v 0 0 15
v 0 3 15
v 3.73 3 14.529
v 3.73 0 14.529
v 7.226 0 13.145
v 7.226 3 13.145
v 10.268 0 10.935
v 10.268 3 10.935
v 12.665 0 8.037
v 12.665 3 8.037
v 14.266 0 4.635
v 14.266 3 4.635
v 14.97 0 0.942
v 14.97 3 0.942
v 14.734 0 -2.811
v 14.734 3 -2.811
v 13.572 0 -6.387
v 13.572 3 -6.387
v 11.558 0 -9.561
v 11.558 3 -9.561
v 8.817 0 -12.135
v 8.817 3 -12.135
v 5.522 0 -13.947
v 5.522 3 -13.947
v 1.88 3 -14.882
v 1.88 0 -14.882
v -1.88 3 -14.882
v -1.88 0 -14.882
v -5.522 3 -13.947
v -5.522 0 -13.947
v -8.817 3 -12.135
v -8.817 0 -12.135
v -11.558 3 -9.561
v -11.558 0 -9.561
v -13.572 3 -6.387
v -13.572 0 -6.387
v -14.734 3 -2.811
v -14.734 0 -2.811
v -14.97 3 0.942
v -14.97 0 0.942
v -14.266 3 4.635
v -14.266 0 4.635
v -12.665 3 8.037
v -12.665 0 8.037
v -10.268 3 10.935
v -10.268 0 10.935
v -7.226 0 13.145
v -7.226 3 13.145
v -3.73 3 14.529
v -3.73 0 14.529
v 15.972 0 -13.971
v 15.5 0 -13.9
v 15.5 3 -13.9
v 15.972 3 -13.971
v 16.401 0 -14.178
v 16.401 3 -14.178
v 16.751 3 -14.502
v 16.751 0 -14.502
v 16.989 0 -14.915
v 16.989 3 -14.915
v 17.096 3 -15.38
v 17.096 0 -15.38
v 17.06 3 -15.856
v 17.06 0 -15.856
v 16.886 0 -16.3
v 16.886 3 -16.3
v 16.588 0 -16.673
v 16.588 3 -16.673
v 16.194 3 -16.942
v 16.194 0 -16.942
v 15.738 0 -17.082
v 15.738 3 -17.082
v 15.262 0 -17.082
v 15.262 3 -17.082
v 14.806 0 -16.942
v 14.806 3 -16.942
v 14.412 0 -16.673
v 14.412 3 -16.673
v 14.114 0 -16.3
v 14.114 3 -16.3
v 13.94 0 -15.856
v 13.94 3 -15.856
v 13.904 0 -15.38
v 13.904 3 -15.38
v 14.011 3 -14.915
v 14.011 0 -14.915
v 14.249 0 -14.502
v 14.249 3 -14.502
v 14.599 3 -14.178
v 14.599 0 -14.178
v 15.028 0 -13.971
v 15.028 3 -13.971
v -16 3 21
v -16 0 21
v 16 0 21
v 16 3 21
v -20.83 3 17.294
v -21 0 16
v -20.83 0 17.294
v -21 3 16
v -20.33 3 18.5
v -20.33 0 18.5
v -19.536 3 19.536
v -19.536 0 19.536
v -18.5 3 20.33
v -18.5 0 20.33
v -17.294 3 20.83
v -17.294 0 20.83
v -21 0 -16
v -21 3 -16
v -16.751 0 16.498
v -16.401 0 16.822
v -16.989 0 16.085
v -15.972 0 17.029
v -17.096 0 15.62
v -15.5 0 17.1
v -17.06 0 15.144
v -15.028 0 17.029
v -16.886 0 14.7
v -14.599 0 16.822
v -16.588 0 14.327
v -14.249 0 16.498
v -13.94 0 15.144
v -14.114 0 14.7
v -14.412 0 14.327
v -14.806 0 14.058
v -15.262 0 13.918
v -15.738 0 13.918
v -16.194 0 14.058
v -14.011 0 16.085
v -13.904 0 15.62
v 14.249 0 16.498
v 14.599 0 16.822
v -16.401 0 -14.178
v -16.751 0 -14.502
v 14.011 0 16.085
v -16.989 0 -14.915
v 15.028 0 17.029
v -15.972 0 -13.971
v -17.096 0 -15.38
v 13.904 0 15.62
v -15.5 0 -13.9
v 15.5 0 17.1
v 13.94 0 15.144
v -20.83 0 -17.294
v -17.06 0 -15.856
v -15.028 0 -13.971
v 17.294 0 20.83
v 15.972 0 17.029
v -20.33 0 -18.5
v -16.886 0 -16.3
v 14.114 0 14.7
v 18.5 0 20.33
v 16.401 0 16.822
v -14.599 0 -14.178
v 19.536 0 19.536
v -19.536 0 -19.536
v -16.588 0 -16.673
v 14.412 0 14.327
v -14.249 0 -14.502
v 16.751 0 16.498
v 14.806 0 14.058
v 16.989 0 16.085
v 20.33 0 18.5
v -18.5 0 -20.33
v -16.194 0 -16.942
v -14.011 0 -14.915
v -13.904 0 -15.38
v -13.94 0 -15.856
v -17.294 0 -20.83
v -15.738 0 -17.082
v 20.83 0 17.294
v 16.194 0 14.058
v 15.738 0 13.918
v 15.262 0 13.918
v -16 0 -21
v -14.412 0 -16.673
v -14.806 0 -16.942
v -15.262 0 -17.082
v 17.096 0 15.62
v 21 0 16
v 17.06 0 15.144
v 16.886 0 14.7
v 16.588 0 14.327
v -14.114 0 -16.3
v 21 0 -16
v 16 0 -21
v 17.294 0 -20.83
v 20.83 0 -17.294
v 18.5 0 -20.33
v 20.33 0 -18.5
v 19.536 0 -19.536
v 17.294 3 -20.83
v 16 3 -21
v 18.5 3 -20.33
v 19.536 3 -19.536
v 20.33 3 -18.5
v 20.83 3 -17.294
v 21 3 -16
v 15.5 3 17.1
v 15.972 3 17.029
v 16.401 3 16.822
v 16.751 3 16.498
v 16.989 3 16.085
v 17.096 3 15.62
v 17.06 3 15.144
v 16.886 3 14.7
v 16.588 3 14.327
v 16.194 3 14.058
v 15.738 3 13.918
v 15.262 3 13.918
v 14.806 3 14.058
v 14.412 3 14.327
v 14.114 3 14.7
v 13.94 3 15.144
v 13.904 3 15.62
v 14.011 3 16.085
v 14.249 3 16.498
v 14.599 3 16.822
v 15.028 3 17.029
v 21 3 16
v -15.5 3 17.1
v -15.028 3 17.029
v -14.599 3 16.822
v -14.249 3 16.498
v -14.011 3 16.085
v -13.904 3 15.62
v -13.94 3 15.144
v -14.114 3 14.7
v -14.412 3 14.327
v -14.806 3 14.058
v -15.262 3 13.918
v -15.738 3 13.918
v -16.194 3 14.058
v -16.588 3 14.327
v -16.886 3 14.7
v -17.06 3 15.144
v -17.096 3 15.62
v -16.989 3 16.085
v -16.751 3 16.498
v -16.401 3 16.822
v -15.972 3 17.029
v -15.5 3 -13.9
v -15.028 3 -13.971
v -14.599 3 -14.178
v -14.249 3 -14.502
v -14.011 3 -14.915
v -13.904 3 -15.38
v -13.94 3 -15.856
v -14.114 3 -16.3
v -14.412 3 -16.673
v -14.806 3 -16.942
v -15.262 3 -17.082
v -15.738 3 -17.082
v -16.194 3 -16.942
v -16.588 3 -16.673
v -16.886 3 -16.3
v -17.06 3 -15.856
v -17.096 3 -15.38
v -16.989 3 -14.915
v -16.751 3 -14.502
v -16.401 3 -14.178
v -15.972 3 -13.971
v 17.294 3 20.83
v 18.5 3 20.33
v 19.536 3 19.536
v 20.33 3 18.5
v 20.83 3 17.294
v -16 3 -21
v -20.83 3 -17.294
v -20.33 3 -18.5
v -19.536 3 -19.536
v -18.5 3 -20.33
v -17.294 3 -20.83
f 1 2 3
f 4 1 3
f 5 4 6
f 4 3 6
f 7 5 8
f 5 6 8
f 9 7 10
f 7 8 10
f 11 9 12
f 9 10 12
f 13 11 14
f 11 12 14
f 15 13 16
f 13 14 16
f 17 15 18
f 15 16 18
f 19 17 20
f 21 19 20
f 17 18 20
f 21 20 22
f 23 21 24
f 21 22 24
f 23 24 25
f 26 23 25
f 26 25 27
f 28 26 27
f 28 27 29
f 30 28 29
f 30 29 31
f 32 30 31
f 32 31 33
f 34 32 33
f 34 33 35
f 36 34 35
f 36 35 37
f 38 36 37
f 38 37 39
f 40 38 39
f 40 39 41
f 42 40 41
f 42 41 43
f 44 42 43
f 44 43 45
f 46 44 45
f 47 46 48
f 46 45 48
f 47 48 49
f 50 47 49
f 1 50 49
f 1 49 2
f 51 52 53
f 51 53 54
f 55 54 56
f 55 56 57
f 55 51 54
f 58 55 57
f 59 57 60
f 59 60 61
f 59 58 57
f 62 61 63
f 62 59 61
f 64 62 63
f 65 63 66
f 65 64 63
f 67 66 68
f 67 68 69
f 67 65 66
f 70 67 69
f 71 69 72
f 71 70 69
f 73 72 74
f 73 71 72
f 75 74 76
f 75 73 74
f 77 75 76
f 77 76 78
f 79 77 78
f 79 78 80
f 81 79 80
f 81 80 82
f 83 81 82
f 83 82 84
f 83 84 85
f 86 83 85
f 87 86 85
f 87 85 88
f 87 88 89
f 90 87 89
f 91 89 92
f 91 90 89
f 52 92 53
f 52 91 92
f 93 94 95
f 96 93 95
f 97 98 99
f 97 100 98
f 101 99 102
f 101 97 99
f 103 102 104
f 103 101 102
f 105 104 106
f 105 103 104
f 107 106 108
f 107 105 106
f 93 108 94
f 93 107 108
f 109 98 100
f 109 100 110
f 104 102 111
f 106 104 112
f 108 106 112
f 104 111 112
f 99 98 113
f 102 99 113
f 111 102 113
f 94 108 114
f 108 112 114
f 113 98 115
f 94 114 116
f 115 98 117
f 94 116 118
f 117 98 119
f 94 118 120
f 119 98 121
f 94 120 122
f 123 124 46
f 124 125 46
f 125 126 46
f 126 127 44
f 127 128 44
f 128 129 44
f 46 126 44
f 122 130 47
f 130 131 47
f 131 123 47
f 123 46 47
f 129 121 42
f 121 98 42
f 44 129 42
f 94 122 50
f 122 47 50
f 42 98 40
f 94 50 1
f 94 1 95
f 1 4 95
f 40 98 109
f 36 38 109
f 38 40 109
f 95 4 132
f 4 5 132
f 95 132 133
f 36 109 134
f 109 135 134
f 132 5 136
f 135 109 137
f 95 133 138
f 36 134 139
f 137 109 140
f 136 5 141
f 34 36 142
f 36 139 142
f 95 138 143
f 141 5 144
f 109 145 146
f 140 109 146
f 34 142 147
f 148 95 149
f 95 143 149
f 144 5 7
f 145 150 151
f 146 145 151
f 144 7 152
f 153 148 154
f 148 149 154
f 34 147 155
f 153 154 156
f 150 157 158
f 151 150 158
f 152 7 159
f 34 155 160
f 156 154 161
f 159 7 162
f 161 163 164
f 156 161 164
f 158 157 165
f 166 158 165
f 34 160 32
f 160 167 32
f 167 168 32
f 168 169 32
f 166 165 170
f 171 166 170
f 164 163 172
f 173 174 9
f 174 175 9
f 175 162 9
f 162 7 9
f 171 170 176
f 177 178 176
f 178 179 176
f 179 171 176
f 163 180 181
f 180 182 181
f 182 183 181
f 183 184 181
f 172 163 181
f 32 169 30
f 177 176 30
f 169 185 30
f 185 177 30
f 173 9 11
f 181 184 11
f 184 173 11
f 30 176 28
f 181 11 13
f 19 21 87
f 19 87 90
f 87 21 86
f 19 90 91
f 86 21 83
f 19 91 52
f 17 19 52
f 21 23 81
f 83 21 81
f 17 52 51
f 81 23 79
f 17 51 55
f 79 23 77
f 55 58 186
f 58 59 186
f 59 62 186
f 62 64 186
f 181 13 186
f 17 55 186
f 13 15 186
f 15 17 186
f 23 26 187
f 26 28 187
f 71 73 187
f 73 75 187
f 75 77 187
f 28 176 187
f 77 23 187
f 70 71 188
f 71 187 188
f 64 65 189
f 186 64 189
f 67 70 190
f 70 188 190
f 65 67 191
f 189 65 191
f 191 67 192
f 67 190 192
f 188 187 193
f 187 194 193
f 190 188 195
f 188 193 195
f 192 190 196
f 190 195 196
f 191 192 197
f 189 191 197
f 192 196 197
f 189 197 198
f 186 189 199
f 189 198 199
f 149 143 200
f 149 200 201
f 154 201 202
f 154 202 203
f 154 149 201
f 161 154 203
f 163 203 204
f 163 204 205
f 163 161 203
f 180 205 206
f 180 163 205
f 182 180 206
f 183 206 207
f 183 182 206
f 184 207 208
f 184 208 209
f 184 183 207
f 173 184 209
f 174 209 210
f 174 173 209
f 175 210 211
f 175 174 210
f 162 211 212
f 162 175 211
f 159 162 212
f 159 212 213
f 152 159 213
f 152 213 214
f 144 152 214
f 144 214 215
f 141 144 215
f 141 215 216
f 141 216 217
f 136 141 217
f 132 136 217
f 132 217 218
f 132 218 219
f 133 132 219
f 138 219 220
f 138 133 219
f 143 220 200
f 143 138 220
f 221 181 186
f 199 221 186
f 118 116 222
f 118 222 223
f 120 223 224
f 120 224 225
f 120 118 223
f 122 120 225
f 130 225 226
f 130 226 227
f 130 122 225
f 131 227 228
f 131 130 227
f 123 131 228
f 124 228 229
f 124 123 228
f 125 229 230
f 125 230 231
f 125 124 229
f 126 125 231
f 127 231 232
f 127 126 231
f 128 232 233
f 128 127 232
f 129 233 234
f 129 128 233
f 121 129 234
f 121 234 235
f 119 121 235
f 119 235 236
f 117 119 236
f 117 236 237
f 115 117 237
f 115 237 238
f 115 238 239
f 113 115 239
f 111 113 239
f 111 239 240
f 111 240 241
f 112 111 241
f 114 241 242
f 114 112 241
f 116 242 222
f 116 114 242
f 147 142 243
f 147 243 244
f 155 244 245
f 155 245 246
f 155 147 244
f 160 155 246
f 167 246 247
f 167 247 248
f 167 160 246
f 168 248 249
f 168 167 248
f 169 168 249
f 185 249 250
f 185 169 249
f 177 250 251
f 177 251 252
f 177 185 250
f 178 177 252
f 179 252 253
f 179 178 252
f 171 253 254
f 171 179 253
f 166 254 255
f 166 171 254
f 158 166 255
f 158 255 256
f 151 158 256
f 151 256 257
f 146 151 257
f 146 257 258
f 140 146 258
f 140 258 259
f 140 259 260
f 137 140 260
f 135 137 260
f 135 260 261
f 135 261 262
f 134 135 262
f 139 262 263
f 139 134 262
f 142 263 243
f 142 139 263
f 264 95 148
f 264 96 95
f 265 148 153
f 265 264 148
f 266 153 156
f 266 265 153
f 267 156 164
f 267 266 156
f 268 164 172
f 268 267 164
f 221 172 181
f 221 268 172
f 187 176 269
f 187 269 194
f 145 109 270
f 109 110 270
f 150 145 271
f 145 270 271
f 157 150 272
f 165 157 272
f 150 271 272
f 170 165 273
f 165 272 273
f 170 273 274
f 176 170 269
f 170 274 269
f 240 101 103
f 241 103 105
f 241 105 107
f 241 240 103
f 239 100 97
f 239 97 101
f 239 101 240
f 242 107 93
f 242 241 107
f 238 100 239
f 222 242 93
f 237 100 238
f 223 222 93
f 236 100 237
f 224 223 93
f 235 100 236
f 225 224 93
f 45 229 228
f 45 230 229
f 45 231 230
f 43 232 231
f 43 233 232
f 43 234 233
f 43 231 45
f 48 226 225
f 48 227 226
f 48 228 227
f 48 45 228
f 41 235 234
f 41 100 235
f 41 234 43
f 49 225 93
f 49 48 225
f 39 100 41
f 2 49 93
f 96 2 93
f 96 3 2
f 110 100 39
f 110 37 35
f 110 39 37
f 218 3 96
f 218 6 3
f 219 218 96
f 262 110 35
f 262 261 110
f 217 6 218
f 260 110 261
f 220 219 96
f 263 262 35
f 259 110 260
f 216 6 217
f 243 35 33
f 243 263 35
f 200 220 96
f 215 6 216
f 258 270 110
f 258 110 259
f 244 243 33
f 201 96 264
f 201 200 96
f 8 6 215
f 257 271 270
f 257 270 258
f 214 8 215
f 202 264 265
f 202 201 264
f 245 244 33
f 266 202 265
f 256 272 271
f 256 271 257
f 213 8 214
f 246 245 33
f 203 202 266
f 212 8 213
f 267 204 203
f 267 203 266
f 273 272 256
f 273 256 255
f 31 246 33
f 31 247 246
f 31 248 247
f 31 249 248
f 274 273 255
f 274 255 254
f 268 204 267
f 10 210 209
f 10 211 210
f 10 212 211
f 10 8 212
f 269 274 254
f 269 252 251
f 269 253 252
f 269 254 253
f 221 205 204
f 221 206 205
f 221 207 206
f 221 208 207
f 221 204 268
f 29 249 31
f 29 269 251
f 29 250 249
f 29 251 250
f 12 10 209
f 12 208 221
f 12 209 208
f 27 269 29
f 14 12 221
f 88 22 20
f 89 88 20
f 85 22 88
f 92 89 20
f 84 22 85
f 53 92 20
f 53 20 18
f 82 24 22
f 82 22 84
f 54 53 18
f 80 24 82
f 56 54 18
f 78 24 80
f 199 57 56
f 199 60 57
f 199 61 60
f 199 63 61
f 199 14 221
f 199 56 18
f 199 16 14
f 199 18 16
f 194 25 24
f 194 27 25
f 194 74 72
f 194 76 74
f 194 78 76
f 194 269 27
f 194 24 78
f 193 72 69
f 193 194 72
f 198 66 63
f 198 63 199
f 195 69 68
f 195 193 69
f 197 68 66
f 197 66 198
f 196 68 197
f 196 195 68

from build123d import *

# Parameters (mm, degrees)
SKETCH_1_W          = 42
SKETCH_1_H          = 42
SKETCH_1_R          = 1.6
SKETCH_1_R_2        = 11
EXTRUDE_1_DEPTH     = 3
SKETCH_2_R          = 15
CUT_EXTRUDE_1_DEPTH = 30.849623113
FILLET_1_R          = 5


with BuildPart() as part:
    # 草图1 → 凸台-拉伸1 (new body)
    with BuildSketch(Plane(origin=(0, 0, 0), x_dir=(1, 0, 0), z_dir=(0, 1, 0))):
        Rectangle(SKETCH_1_W, SKETCH_1_H)
        with Locations(Location((-15.5, 15.5, 0), (0, 0, 270))):
            Circle(SKETCH_1_R, mode=Mode.SUBTRACT)
        with Locations(Location((15.5, 15.5, 0), (0, 0, 270))):
            Circle(SKETCH_1_R, mode=Mode.SUBTRACT)
        with Locations(Location((15.5, -15.5, 0), (0, 0, 270))):
            Circle(SKETCH_1_R, mode=Mode.SUBTRACT)
        with Locations(Location((-15.5, -15.5, 0), (0, 0, 270))):
            Circle(SKETCH_1_R, mode=Mode.SUBTRACT)
        with Locations(Location((0.145011043, -0.145011043, 0), (0, 0, 270))):
            Circle(SKETCH_1_R_2, mode=Mode.SUBTRACT)
    extrude(amount=EXTRUDE_1_DEPTH)

    # 草图2 → 切除-拉伸1 (cut, through all)
    with BuildSketch(Plane(origin=(0, 3, 0), x_dir=(1, 0, 0), z_dir=(0, 1, 0))):
        with Locations(Location((0, 0, 0), (0, 0, 270))):
            Circle(SKETCH_2_R)
    extrude(amount=-CUT_EXTRUDE_1_DEPTH, mode=Mode.SUBTRACT)

    # 圆角1
    fillet_1_edges = [part.edges().sort_by_distance(p)[0] for p in [
        (-21, 1.5, 21),
        (-21, 1.5, -21),
        (21, 1.5, -21),
        (21, 1.5, 21),
    ]]
    fillet(fillet_1_edges, radius=FILLET_1_R)


solid = part.part
